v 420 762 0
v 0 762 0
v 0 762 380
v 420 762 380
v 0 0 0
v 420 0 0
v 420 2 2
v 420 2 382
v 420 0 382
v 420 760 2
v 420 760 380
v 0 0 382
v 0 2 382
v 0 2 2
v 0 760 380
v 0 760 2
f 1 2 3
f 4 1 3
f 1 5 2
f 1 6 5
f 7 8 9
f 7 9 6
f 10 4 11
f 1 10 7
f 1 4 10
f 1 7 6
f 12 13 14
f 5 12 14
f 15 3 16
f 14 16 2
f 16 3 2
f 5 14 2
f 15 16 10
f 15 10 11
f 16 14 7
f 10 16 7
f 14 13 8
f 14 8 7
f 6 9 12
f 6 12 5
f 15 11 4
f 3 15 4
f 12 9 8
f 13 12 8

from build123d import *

# Parameters (mm, degrees)
SKETCH3_W           = 420
SKETCH3_H           = 760
BOSS_EXTRUDE1_DEPTH = 2
SKETCH7_W           = 380
SKETCH7_H           = 2
BOSS_EXTRUDE2_DEPTH = 420
SKETCH9_W           = 382
SKETCH9_H           = 2
BOSS_EXTRUDE3_DEPTH = 420


with BuildPart() as part:
    # Sketch3 → Boss-Extrude1 (new body)
    with BuildSketch(Plane.XY):
        with Locations((210, 380)):
            Rectangle(SKETCH3_W, SKETCH3_H)
    extrude(amount=BOSS_EXTRUDE1_DEPTH)

    # Sketch7 → Boss-Extrude2 (add)
    with BuildSketch(Plane(origin=(420, 760, 0), x_dir=(0, 0, 1), z_dir=(-1, 0, 0))):
        with Locations((190, 1)):
            Rectangle(SKETCH7_W, SKETCH7_H)
    extrude(amount=BOSS_EXTRUDE2_DEPTH)

    # Sketch9 → Boss-Extrude3 (add)
    with BuildSketch(Plane(origin=(420, 0, 2), x_dir=(0, 0, -1), z_dir=(1, 0, 0))):
        with Locations((-189, 1)):
            Rectangle(SKETCH9_W, SKETCH9_H)
    extrude(amount=-BOSS_EXTRUDE3_DEPTH)


solid = part.part
